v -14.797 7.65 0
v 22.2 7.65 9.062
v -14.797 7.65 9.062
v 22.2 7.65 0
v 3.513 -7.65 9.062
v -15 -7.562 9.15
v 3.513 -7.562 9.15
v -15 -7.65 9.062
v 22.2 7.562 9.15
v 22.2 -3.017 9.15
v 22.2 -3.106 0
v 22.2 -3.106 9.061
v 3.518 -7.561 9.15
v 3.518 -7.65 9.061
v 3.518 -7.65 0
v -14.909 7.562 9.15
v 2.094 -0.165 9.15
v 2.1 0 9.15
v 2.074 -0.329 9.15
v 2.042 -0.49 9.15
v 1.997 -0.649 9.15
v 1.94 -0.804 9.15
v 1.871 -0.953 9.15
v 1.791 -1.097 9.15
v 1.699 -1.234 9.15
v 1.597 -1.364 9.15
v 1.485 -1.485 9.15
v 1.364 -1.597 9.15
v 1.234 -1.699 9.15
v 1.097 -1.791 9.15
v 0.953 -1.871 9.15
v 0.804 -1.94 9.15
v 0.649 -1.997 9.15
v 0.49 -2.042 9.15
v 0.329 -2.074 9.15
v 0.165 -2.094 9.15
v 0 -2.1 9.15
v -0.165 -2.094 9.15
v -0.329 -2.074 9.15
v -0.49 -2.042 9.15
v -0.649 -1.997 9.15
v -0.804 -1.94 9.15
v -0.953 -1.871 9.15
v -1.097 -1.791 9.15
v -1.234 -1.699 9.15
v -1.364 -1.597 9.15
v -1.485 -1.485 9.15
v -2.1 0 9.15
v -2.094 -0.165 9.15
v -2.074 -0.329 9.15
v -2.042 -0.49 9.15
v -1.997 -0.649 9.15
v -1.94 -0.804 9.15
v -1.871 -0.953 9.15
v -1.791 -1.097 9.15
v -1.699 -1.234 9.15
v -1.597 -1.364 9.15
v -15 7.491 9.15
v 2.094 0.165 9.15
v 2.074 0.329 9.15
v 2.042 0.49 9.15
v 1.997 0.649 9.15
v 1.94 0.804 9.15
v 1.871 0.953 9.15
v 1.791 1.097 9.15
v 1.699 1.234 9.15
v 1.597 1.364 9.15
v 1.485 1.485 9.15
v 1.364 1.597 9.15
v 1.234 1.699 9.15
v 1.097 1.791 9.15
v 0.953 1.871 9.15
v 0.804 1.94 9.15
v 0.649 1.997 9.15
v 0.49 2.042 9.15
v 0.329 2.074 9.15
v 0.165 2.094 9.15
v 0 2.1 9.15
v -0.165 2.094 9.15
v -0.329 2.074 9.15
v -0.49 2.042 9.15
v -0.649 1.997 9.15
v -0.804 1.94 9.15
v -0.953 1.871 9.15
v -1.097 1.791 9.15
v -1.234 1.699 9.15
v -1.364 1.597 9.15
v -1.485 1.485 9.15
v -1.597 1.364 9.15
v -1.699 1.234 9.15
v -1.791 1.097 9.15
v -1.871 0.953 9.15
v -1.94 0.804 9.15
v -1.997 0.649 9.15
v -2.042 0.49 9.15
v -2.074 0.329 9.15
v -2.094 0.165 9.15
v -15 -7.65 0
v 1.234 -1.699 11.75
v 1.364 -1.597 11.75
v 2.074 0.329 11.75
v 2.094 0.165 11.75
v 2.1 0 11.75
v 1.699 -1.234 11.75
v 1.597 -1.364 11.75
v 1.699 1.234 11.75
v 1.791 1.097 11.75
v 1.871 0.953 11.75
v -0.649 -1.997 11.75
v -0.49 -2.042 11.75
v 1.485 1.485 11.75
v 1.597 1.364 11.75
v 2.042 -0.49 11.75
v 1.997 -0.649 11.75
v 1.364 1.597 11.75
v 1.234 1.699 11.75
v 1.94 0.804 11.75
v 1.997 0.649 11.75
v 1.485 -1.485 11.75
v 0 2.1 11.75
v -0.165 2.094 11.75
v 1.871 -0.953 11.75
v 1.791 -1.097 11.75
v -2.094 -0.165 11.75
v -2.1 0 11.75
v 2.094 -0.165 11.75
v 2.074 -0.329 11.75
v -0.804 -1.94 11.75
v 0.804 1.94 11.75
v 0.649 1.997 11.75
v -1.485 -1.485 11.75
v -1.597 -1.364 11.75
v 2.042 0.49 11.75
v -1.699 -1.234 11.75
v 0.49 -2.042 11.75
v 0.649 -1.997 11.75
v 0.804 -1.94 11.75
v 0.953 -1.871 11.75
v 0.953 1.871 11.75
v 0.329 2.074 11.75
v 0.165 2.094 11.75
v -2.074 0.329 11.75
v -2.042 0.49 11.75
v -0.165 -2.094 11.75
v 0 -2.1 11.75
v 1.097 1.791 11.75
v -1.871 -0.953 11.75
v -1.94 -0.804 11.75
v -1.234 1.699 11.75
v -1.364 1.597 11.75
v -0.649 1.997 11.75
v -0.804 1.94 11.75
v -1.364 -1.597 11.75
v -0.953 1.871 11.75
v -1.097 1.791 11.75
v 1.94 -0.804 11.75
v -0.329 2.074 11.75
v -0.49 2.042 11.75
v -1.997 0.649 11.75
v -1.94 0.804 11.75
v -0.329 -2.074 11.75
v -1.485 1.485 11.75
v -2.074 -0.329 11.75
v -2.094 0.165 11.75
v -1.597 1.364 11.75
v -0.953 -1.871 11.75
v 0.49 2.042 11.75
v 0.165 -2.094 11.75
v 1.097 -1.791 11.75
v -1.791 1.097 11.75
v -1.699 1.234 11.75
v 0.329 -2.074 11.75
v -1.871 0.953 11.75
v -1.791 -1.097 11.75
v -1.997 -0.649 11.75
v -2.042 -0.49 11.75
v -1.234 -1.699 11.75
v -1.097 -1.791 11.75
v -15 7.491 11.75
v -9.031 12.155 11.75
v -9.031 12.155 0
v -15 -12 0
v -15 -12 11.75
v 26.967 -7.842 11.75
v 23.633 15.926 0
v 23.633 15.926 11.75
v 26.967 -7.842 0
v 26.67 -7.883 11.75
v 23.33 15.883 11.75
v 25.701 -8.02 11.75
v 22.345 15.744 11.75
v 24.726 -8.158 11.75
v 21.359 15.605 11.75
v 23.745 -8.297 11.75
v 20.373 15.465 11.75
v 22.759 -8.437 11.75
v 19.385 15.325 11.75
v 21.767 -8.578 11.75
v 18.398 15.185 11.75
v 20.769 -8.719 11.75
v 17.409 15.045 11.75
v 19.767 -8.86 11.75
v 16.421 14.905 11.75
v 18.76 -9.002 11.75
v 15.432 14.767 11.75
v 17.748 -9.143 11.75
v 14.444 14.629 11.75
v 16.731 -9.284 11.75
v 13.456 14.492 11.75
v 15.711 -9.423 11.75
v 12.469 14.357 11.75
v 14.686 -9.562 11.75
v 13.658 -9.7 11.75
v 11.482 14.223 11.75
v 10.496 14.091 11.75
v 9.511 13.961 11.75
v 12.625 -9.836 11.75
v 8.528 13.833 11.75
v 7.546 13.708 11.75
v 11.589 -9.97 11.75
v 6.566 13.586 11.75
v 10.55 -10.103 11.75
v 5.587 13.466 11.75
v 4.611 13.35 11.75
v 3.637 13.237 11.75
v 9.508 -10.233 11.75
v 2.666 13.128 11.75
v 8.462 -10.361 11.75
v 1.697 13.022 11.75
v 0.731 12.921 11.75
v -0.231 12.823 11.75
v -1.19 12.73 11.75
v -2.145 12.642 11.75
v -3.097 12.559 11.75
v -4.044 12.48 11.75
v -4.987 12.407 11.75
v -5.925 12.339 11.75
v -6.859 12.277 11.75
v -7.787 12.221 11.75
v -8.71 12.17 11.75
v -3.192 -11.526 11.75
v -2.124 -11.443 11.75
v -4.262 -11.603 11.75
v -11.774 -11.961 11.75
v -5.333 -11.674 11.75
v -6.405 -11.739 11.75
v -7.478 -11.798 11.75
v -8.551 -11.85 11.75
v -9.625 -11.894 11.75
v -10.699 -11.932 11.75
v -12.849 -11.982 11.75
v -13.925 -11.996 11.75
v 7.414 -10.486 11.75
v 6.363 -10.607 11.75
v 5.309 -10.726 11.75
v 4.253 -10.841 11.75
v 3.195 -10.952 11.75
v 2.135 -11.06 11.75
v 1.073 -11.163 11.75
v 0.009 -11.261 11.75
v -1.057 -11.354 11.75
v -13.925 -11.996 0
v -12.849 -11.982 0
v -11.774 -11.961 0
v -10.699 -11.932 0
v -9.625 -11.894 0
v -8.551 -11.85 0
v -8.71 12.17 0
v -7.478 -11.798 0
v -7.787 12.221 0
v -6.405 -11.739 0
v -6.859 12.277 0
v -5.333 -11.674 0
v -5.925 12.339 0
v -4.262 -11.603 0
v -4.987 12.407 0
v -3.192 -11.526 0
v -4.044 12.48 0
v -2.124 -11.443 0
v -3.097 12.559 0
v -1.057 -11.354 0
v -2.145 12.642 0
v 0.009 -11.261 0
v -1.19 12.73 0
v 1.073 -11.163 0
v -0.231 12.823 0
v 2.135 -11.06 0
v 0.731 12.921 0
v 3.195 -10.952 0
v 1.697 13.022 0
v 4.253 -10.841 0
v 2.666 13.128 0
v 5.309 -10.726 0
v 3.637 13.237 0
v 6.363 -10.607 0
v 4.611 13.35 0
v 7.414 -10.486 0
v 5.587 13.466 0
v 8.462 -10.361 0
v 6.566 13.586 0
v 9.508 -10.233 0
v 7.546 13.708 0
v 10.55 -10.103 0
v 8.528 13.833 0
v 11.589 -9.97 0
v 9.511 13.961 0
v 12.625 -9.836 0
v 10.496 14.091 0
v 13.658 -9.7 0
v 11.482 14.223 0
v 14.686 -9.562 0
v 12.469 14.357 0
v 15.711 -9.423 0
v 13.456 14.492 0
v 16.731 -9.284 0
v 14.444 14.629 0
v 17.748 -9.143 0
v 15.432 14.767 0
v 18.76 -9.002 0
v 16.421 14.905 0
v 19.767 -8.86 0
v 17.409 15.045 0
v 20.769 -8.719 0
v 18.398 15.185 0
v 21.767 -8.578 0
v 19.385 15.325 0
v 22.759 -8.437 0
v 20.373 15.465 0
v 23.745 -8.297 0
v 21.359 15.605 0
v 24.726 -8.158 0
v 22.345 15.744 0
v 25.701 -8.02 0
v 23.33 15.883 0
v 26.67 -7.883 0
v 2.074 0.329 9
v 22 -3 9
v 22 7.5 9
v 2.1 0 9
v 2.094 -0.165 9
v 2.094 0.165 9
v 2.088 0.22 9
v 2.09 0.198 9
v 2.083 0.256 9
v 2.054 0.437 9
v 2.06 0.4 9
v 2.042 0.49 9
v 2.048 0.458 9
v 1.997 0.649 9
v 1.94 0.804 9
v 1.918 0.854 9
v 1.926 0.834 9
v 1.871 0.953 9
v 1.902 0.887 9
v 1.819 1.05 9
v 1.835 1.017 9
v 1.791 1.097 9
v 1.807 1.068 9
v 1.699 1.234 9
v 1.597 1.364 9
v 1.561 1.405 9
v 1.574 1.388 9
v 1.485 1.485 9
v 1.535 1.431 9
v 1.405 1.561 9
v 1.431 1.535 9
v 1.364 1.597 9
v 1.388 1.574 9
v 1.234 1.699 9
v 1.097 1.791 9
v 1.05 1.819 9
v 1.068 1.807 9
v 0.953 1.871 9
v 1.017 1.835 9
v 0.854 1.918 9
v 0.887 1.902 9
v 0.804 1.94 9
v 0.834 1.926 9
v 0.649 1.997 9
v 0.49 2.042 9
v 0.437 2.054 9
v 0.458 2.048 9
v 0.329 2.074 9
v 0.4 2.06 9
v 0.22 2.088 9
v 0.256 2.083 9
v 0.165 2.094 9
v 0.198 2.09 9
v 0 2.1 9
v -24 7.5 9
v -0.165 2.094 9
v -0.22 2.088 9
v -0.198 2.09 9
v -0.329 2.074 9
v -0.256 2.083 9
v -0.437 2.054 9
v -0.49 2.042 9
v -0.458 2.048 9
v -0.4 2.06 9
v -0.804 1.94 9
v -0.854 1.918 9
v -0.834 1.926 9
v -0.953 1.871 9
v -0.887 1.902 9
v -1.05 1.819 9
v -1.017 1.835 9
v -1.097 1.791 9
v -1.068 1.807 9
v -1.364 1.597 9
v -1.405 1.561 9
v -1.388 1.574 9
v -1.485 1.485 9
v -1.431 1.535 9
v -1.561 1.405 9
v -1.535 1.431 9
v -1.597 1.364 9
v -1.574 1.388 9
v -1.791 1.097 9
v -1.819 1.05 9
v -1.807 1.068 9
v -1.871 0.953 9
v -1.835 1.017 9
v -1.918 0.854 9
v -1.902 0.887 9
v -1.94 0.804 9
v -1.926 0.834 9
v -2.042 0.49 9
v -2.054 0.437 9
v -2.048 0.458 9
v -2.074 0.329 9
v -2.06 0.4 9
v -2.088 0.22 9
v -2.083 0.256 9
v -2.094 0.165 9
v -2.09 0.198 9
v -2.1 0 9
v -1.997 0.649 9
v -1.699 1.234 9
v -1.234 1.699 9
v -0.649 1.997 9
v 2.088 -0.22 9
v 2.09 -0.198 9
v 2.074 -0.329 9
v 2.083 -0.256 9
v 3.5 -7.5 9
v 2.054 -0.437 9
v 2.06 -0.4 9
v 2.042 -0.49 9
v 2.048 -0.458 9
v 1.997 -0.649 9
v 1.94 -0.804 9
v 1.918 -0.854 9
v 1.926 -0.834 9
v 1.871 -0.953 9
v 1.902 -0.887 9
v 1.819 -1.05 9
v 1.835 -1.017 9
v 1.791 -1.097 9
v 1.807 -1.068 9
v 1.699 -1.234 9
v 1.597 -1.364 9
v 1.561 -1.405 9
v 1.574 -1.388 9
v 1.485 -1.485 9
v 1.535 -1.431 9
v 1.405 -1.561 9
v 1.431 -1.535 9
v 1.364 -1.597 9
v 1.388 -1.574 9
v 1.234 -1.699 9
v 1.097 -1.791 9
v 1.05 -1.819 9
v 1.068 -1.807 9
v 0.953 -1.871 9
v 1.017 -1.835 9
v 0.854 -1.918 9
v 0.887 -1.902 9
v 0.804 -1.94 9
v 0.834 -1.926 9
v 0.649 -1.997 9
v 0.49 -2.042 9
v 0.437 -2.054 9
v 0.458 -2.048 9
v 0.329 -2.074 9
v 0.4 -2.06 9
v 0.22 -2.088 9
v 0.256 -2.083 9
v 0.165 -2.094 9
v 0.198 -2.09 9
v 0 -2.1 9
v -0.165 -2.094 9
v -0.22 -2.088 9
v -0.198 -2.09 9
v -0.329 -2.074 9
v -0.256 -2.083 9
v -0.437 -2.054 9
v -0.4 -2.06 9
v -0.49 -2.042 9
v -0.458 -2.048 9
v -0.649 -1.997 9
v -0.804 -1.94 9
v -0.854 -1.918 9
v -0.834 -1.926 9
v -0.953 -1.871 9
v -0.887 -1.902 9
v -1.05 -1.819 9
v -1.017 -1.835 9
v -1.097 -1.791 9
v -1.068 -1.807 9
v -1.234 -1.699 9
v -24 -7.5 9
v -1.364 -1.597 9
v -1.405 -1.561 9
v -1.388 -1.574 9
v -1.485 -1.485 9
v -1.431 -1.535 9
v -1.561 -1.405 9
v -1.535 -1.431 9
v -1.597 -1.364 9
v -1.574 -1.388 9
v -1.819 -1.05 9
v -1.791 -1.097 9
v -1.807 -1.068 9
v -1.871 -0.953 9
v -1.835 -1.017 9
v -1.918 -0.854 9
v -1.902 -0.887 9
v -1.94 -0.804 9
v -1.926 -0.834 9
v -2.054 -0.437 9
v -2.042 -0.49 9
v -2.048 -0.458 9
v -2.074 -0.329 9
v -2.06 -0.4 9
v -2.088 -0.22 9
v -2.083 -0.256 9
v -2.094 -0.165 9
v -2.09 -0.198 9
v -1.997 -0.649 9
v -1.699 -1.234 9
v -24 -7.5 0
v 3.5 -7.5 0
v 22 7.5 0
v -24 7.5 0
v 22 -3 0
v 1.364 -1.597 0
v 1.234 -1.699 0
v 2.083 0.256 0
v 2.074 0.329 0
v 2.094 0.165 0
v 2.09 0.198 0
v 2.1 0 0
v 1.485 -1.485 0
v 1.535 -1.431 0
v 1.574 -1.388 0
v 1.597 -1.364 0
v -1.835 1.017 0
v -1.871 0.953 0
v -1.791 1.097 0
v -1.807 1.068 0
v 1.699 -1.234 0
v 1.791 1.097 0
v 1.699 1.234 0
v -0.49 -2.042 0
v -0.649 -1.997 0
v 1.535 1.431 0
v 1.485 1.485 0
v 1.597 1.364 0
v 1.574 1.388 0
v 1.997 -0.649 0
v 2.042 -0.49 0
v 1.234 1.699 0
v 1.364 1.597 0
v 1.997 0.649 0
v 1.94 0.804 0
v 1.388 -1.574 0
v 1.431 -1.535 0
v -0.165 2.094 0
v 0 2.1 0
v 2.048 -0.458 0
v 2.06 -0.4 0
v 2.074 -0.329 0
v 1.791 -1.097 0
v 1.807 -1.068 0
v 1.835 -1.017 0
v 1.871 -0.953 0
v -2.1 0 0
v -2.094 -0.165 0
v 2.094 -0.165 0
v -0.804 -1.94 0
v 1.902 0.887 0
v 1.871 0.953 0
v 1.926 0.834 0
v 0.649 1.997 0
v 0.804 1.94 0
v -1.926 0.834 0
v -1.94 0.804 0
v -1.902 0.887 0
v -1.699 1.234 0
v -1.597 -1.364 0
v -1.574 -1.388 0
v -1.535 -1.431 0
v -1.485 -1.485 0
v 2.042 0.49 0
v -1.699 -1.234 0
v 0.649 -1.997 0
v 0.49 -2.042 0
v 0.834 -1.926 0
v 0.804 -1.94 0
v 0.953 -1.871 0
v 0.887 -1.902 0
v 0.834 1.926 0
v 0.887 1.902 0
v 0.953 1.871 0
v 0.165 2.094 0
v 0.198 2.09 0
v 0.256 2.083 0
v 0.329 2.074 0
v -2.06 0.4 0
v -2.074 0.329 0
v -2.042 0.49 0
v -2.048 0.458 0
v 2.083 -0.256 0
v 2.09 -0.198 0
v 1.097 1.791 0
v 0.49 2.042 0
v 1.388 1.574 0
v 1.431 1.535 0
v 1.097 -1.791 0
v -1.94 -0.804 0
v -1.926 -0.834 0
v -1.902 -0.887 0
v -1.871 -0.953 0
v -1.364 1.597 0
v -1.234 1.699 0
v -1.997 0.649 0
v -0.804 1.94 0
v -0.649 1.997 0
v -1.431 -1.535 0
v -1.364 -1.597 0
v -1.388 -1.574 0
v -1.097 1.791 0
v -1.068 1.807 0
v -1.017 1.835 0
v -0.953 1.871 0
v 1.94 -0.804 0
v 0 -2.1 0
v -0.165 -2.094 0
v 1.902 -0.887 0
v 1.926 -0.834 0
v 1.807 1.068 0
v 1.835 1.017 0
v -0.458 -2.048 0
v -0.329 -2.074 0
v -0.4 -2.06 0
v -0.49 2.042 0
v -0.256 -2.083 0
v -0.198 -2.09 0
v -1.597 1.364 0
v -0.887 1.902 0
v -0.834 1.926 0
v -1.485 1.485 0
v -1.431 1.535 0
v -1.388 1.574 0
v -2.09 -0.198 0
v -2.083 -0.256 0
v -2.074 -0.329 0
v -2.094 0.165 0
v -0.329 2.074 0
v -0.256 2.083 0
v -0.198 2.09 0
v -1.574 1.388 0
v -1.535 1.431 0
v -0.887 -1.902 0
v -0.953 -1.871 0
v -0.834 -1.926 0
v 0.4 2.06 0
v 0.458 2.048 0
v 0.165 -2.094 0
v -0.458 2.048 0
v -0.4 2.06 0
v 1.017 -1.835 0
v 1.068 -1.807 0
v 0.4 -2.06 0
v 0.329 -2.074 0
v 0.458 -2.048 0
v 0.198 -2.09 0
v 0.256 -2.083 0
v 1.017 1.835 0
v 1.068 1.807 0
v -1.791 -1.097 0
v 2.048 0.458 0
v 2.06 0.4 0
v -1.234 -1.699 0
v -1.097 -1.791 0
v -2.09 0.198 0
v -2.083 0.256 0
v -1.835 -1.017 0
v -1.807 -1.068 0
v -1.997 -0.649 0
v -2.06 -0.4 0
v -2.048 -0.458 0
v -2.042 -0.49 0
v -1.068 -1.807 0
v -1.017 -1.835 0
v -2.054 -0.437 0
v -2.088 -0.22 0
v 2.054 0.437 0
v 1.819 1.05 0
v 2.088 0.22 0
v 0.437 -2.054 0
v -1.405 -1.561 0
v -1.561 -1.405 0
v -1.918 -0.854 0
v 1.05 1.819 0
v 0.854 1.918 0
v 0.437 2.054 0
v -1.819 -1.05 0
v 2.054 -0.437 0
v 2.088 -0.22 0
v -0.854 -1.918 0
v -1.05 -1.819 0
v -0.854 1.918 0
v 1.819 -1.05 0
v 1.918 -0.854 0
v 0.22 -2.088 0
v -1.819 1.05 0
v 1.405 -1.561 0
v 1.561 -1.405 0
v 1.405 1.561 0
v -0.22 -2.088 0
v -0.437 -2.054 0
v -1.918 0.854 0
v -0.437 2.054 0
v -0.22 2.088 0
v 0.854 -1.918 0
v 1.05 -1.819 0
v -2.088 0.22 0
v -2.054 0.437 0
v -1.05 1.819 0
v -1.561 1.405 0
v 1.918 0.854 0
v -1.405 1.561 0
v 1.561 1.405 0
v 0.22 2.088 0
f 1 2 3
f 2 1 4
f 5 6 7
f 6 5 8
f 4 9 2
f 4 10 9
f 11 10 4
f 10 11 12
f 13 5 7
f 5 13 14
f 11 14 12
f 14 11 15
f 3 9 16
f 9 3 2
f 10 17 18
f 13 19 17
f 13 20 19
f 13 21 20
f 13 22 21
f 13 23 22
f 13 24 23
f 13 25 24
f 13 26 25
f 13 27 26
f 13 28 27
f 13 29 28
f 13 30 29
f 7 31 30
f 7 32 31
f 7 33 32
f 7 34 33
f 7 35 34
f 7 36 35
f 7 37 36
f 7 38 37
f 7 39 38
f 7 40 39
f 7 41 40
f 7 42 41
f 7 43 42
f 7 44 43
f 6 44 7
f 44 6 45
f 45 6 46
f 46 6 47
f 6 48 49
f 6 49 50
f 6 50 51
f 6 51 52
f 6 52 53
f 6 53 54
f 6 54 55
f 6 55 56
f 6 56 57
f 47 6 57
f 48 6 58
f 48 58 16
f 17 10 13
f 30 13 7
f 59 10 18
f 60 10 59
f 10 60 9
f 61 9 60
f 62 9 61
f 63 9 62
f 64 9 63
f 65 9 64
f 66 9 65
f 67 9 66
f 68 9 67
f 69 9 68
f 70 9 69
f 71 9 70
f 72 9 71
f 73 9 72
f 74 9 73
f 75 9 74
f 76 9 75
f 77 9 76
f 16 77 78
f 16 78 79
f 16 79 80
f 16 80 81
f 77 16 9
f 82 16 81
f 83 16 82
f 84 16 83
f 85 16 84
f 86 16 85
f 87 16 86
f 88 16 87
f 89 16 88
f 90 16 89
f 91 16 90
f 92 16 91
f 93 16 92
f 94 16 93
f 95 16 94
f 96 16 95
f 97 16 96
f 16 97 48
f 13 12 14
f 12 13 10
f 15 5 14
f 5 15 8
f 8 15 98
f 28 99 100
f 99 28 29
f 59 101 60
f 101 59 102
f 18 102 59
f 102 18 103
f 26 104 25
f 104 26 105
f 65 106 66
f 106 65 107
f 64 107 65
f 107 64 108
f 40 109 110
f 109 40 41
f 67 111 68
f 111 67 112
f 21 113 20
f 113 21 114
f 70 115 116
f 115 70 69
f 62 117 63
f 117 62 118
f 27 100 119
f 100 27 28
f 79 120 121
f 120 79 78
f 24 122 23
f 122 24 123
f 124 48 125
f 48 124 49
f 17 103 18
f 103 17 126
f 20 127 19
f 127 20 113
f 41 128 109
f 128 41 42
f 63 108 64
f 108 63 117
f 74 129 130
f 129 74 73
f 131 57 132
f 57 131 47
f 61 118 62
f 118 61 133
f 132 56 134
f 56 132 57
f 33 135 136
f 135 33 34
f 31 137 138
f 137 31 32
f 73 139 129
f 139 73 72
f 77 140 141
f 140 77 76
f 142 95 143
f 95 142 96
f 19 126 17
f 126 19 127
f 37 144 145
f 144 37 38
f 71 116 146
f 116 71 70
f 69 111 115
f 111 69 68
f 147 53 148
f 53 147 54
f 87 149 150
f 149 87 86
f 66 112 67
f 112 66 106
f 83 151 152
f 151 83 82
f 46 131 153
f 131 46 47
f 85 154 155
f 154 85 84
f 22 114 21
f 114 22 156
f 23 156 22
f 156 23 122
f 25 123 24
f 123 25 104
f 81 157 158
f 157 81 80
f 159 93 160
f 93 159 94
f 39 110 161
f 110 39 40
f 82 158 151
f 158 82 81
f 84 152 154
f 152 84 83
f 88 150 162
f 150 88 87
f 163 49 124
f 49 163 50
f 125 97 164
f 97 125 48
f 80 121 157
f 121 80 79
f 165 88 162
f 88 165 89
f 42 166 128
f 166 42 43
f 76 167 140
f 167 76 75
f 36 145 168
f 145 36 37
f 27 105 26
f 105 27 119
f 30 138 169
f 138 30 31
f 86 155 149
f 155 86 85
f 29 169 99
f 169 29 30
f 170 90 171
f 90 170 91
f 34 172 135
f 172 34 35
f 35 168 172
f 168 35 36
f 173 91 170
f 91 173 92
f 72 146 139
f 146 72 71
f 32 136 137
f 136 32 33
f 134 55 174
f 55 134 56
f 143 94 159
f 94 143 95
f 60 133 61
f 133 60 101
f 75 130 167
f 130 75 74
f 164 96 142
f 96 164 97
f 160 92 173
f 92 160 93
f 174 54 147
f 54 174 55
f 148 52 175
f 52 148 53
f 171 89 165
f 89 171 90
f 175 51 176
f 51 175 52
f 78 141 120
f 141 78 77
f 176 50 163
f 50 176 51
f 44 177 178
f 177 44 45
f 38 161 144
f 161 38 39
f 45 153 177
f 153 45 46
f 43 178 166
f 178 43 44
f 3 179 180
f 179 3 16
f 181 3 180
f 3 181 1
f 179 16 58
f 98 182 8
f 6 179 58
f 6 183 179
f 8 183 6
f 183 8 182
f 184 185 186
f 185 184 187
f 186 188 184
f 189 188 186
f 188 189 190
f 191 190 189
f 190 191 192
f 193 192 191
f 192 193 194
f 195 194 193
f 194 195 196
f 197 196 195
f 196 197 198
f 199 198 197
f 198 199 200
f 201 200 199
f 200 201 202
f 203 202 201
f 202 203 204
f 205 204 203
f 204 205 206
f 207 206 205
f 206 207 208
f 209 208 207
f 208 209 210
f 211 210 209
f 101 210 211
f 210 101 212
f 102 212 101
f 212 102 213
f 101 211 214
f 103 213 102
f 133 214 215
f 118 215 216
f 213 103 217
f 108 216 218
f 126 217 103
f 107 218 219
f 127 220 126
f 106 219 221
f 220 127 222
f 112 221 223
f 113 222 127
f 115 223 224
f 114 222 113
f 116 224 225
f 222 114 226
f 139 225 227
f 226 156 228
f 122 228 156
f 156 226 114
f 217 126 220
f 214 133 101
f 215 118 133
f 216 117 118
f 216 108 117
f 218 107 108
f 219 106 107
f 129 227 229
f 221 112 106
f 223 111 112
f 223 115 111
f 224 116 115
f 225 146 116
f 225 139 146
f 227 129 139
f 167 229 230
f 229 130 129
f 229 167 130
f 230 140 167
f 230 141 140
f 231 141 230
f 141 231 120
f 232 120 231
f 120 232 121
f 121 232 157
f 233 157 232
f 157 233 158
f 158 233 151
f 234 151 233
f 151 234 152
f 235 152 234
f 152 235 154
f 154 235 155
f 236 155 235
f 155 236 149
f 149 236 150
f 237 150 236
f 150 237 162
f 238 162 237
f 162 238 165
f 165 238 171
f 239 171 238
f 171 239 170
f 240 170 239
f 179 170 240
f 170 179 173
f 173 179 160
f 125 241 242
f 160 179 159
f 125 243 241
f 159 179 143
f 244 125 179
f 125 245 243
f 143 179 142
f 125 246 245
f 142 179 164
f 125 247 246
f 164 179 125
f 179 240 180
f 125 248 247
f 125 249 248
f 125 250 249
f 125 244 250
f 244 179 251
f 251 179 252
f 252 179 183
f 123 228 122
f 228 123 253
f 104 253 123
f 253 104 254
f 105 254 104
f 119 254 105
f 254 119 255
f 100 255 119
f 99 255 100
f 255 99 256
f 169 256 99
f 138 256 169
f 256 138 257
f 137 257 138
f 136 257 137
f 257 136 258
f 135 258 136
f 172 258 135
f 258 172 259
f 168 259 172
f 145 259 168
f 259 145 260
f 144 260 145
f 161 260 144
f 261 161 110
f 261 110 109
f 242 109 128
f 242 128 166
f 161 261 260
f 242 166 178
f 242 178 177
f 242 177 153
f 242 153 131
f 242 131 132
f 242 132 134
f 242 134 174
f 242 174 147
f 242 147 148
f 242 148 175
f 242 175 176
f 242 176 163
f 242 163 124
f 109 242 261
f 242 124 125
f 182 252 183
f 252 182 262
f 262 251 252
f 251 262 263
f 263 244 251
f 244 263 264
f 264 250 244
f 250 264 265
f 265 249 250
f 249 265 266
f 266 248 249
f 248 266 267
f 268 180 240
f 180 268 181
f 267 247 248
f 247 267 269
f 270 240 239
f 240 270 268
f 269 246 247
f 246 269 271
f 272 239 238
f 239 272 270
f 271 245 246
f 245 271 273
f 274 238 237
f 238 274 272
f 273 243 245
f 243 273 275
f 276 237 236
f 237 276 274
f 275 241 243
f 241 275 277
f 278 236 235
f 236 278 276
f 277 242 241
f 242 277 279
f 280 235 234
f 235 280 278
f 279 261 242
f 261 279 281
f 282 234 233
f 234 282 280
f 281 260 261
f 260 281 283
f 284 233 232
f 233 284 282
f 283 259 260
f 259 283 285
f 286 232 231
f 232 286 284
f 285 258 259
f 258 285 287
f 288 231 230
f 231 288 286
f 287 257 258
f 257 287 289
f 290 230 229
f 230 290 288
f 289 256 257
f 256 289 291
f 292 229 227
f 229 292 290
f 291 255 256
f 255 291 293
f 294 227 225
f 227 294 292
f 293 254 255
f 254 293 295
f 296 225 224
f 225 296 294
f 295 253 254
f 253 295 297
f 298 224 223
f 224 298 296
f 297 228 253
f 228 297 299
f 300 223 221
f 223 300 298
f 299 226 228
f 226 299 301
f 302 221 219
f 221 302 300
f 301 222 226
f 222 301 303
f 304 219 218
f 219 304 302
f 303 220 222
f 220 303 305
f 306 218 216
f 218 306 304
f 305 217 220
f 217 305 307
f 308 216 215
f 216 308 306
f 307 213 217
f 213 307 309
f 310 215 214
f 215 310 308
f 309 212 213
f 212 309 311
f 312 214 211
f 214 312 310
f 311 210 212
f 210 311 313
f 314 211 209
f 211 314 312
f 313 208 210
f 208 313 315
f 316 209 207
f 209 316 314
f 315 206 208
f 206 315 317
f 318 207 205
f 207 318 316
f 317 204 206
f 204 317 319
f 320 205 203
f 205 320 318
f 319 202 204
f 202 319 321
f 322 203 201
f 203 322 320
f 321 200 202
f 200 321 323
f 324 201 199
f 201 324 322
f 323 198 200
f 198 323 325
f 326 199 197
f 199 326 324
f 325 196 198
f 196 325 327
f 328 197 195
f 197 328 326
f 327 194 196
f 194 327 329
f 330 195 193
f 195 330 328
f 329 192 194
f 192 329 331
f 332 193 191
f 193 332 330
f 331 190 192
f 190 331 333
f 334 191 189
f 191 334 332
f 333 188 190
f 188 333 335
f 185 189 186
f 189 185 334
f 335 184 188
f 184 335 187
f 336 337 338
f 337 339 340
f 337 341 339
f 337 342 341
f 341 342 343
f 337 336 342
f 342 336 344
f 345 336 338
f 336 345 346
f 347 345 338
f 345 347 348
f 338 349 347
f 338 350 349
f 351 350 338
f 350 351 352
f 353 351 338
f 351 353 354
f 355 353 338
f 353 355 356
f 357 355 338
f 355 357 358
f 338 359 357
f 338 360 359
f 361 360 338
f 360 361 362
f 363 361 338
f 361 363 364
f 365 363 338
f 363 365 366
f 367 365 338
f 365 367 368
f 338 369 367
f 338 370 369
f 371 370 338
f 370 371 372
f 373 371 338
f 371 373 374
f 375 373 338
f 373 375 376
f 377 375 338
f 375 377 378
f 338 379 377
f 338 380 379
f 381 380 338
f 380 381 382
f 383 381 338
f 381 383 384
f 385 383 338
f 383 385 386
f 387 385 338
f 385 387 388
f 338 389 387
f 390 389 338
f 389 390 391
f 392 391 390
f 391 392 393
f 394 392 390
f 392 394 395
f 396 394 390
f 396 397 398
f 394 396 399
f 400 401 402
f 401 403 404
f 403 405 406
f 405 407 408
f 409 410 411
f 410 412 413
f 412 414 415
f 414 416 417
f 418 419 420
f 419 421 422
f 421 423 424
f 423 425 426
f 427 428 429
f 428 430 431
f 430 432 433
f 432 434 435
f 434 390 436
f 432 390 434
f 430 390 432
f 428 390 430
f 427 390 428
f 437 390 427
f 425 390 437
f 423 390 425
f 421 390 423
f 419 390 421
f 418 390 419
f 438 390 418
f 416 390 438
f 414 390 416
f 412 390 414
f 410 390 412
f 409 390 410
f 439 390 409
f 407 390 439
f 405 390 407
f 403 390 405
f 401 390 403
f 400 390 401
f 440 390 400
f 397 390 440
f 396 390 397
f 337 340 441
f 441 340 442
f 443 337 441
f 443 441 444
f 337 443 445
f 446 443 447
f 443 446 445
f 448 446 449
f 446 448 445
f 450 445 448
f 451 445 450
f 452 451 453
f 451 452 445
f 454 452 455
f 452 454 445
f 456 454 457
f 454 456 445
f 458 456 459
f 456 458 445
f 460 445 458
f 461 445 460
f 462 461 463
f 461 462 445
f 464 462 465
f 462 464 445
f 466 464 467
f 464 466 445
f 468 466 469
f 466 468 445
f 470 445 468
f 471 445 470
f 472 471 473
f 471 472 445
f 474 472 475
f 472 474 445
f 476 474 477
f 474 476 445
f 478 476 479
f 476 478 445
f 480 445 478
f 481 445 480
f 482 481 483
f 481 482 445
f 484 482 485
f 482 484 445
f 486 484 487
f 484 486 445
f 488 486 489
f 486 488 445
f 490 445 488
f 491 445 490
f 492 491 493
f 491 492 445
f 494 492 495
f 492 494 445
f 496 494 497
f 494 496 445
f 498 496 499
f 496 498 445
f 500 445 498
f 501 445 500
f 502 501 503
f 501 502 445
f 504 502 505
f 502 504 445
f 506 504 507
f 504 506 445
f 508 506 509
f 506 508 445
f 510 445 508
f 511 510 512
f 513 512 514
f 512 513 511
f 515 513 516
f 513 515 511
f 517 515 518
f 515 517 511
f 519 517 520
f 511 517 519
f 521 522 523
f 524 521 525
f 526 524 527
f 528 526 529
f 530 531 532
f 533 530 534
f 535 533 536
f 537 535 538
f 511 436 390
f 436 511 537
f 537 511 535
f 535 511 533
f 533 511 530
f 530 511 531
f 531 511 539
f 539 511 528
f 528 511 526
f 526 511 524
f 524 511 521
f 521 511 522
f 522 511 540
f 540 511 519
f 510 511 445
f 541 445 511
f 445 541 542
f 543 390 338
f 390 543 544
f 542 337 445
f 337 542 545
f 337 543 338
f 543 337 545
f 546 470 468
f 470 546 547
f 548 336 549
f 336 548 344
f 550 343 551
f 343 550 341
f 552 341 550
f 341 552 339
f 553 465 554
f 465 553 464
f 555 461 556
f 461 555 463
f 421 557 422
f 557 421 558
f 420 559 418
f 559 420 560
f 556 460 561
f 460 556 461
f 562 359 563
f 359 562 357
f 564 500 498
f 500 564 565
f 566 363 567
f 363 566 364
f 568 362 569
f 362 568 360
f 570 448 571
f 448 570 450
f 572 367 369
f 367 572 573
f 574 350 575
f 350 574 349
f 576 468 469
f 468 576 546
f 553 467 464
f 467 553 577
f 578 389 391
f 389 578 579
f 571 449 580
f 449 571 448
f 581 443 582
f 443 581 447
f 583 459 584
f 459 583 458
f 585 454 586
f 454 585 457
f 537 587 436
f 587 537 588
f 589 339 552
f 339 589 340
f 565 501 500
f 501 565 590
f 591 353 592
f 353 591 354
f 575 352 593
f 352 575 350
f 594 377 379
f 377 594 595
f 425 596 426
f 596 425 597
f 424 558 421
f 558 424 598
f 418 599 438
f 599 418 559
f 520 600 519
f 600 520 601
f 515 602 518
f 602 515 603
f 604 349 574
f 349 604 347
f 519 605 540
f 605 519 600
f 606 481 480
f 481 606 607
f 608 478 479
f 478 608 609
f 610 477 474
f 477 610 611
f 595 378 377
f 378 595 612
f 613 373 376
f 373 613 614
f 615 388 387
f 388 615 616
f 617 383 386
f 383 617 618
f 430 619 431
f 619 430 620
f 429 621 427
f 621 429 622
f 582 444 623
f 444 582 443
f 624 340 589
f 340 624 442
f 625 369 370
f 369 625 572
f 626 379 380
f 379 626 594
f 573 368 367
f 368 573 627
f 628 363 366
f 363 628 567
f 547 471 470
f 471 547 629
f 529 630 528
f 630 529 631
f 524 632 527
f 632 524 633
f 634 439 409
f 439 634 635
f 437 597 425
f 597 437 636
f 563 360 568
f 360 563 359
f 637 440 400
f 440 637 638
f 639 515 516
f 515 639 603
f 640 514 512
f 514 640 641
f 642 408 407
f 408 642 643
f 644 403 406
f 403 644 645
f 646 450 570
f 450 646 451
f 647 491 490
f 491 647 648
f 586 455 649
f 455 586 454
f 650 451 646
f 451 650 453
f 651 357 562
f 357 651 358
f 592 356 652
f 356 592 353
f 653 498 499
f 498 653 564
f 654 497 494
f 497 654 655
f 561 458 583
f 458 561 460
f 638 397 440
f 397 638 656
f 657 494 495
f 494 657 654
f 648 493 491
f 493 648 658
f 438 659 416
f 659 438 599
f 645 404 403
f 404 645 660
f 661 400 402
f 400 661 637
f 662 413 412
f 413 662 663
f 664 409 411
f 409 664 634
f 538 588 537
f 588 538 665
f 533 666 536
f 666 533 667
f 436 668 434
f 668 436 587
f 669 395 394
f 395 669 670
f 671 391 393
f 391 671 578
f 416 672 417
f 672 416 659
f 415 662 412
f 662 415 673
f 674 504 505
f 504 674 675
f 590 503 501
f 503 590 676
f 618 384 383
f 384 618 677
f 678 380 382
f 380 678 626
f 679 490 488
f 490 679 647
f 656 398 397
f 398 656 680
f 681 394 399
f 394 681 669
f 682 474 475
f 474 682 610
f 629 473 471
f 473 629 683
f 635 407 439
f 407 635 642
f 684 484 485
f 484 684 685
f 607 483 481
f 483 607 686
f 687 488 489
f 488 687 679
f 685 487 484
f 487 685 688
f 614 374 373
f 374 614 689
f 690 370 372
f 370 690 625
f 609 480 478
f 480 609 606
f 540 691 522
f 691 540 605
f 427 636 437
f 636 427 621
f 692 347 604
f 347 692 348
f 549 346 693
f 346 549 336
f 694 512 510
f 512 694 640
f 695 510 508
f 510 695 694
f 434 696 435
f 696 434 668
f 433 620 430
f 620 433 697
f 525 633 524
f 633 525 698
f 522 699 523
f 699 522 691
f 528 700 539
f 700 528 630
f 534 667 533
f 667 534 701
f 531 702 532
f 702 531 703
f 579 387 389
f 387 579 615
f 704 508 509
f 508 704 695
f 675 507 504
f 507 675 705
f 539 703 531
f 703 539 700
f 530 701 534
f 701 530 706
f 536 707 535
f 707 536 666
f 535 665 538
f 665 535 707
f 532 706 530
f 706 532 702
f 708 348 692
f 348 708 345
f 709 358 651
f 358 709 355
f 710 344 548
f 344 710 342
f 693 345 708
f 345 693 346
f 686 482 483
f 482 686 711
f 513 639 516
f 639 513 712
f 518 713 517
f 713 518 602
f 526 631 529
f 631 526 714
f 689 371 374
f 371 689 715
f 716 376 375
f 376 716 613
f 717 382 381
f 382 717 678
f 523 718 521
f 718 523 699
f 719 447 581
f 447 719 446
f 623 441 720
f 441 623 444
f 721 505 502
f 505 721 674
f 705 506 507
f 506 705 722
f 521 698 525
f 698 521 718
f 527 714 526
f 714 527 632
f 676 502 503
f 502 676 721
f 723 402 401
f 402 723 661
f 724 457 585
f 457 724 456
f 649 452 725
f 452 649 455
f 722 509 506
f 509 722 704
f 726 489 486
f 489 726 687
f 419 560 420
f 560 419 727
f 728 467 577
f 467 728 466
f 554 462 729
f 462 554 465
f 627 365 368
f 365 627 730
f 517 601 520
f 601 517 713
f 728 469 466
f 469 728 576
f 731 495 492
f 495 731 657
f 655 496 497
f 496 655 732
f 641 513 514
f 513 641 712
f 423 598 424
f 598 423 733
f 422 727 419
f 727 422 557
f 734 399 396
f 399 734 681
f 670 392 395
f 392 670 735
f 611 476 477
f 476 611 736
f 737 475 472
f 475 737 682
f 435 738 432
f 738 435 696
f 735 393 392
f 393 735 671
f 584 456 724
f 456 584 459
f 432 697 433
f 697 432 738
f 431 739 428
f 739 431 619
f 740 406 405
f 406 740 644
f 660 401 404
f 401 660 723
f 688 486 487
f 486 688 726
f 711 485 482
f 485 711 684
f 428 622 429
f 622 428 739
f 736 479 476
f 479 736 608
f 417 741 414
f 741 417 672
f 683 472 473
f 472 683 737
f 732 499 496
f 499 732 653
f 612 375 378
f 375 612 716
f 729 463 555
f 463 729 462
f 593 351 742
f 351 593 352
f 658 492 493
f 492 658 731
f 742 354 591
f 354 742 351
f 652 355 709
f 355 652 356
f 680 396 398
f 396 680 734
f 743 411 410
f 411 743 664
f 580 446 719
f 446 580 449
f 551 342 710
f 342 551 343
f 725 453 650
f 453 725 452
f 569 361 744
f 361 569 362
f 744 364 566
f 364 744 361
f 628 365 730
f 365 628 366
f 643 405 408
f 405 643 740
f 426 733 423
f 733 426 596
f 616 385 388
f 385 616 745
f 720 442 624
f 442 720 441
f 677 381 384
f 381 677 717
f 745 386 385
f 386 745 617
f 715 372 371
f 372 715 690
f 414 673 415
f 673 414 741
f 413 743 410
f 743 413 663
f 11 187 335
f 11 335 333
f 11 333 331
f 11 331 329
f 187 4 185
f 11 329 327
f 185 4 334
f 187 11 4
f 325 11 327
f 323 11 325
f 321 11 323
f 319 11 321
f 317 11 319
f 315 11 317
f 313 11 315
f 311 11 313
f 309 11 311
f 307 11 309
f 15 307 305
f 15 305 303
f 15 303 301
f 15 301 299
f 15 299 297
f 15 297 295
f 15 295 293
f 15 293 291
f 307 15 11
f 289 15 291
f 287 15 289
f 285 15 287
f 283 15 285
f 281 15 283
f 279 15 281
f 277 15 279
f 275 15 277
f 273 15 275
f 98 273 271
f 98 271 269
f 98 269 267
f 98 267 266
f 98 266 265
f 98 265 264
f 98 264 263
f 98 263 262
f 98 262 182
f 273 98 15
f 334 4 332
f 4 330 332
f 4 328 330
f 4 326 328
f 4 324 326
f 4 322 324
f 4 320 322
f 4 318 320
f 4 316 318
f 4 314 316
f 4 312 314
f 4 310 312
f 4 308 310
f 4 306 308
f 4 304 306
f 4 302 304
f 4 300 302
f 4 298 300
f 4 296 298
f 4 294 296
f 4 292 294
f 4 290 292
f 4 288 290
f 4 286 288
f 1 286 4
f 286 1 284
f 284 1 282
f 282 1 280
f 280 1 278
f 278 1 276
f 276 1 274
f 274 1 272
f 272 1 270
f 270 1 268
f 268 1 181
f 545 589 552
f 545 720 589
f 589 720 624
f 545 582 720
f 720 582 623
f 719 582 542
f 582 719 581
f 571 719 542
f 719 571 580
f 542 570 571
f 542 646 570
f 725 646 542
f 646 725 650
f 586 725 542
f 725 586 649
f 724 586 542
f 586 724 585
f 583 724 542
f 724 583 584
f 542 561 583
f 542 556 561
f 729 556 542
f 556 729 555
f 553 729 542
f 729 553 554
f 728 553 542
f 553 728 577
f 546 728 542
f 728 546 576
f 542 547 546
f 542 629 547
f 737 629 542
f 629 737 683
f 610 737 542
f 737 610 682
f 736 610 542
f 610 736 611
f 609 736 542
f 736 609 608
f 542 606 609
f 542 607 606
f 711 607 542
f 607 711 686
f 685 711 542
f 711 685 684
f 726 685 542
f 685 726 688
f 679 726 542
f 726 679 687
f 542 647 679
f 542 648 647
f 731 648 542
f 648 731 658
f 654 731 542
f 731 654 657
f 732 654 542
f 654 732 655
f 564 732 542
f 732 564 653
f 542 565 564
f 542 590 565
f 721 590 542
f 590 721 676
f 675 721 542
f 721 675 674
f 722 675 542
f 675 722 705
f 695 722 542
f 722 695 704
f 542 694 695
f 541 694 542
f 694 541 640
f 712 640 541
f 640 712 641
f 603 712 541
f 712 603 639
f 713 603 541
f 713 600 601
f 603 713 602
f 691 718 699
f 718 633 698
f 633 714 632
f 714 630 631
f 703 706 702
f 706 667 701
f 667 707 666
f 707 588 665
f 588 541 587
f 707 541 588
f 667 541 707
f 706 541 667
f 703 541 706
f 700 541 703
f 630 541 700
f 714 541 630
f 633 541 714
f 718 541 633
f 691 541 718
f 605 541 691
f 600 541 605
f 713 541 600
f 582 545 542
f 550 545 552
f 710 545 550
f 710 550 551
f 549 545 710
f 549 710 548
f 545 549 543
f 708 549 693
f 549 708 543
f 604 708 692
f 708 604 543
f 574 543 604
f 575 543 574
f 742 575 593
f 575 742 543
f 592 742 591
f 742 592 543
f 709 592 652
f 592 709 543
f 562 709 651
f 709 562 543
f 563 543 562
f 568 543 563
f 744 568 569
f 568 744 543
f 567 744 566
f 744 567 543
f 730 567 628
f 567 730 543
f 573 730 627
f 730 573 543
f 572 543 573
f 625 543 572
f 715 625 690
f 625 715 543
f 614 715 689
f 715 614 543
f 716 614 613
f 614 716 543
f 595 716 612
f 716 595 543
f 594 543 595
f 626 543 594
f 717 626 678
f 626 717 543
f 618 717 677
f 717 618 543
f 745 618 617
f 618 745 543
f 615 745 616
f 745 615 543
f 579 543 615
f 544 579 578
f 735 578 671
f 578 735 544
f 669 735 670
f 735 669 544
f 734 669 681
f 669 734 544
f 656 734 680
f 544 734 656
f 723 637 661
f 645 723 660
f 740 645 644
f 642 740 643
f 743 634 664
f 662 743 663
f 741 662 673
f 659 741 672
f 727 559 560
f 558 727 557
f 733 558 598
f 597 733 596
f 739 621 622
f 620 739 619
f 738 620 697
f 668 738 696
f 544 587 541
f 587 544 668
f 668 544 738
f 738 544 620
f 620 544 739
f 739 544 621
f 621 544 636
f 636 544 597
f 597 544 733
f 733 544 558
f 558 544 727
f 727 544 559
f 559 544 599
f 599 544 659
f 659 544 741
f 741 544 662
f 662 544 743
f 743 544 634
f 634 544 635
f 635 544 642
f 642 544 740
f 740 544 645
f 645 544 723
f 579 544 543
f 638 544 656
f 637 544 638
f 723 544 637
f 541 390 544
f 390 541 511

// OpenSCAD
// Connector / keyed shin fit. Units: mm, connector coordinate frame.
use <../foots.scad>
use <../vptc_roller.scad>
$fn=80;
view="section"; // section, assembly, exploded, fit_print, insertion_check
joint_angle=0;
module fitted_shin(){translate([-47,0,0])rotate([180,180,0])shin(foot=false);}
module local_joint(withdraw=0){
 color("Goldenrod")foot_cuff();
 color("SteelBlue")translate([-withdraw*cos(joint_angle),-withdraw*sin(joint_angle),0])fitted_shin();
}
if(view=="insertion_check"){
 // Empty result is expected at every sampled insertion / withdrawal position.
 for(i=[0:4])let(withdraw=[0,1,5,15,30][i])translate([0,0,60*i])
  intersection(){integrated_foot();translate([-withdraw*cos(joint_angle),-withdraw*sin(joint_angle),0])fitted_shin();}
}
else if(view=="fit_print"){
 // Short samples cut from the real parts; check printer clearance before full prints.
 translate([5,15,11.75])intersection(){foot_cuff();translate([-5,-25,-20])cube([29,50,40]);}
 translate([7,48,9])intersection(){foot_joint_tongue();translate([-7,-20,-20])cube([25,40,40]);}
}
else if(view=="section")intersection(){local_joint();translate([-24,-25,0])cube([55,50,20]);}
else if(view=="exploded")local_joint(38);
else local_joint();
